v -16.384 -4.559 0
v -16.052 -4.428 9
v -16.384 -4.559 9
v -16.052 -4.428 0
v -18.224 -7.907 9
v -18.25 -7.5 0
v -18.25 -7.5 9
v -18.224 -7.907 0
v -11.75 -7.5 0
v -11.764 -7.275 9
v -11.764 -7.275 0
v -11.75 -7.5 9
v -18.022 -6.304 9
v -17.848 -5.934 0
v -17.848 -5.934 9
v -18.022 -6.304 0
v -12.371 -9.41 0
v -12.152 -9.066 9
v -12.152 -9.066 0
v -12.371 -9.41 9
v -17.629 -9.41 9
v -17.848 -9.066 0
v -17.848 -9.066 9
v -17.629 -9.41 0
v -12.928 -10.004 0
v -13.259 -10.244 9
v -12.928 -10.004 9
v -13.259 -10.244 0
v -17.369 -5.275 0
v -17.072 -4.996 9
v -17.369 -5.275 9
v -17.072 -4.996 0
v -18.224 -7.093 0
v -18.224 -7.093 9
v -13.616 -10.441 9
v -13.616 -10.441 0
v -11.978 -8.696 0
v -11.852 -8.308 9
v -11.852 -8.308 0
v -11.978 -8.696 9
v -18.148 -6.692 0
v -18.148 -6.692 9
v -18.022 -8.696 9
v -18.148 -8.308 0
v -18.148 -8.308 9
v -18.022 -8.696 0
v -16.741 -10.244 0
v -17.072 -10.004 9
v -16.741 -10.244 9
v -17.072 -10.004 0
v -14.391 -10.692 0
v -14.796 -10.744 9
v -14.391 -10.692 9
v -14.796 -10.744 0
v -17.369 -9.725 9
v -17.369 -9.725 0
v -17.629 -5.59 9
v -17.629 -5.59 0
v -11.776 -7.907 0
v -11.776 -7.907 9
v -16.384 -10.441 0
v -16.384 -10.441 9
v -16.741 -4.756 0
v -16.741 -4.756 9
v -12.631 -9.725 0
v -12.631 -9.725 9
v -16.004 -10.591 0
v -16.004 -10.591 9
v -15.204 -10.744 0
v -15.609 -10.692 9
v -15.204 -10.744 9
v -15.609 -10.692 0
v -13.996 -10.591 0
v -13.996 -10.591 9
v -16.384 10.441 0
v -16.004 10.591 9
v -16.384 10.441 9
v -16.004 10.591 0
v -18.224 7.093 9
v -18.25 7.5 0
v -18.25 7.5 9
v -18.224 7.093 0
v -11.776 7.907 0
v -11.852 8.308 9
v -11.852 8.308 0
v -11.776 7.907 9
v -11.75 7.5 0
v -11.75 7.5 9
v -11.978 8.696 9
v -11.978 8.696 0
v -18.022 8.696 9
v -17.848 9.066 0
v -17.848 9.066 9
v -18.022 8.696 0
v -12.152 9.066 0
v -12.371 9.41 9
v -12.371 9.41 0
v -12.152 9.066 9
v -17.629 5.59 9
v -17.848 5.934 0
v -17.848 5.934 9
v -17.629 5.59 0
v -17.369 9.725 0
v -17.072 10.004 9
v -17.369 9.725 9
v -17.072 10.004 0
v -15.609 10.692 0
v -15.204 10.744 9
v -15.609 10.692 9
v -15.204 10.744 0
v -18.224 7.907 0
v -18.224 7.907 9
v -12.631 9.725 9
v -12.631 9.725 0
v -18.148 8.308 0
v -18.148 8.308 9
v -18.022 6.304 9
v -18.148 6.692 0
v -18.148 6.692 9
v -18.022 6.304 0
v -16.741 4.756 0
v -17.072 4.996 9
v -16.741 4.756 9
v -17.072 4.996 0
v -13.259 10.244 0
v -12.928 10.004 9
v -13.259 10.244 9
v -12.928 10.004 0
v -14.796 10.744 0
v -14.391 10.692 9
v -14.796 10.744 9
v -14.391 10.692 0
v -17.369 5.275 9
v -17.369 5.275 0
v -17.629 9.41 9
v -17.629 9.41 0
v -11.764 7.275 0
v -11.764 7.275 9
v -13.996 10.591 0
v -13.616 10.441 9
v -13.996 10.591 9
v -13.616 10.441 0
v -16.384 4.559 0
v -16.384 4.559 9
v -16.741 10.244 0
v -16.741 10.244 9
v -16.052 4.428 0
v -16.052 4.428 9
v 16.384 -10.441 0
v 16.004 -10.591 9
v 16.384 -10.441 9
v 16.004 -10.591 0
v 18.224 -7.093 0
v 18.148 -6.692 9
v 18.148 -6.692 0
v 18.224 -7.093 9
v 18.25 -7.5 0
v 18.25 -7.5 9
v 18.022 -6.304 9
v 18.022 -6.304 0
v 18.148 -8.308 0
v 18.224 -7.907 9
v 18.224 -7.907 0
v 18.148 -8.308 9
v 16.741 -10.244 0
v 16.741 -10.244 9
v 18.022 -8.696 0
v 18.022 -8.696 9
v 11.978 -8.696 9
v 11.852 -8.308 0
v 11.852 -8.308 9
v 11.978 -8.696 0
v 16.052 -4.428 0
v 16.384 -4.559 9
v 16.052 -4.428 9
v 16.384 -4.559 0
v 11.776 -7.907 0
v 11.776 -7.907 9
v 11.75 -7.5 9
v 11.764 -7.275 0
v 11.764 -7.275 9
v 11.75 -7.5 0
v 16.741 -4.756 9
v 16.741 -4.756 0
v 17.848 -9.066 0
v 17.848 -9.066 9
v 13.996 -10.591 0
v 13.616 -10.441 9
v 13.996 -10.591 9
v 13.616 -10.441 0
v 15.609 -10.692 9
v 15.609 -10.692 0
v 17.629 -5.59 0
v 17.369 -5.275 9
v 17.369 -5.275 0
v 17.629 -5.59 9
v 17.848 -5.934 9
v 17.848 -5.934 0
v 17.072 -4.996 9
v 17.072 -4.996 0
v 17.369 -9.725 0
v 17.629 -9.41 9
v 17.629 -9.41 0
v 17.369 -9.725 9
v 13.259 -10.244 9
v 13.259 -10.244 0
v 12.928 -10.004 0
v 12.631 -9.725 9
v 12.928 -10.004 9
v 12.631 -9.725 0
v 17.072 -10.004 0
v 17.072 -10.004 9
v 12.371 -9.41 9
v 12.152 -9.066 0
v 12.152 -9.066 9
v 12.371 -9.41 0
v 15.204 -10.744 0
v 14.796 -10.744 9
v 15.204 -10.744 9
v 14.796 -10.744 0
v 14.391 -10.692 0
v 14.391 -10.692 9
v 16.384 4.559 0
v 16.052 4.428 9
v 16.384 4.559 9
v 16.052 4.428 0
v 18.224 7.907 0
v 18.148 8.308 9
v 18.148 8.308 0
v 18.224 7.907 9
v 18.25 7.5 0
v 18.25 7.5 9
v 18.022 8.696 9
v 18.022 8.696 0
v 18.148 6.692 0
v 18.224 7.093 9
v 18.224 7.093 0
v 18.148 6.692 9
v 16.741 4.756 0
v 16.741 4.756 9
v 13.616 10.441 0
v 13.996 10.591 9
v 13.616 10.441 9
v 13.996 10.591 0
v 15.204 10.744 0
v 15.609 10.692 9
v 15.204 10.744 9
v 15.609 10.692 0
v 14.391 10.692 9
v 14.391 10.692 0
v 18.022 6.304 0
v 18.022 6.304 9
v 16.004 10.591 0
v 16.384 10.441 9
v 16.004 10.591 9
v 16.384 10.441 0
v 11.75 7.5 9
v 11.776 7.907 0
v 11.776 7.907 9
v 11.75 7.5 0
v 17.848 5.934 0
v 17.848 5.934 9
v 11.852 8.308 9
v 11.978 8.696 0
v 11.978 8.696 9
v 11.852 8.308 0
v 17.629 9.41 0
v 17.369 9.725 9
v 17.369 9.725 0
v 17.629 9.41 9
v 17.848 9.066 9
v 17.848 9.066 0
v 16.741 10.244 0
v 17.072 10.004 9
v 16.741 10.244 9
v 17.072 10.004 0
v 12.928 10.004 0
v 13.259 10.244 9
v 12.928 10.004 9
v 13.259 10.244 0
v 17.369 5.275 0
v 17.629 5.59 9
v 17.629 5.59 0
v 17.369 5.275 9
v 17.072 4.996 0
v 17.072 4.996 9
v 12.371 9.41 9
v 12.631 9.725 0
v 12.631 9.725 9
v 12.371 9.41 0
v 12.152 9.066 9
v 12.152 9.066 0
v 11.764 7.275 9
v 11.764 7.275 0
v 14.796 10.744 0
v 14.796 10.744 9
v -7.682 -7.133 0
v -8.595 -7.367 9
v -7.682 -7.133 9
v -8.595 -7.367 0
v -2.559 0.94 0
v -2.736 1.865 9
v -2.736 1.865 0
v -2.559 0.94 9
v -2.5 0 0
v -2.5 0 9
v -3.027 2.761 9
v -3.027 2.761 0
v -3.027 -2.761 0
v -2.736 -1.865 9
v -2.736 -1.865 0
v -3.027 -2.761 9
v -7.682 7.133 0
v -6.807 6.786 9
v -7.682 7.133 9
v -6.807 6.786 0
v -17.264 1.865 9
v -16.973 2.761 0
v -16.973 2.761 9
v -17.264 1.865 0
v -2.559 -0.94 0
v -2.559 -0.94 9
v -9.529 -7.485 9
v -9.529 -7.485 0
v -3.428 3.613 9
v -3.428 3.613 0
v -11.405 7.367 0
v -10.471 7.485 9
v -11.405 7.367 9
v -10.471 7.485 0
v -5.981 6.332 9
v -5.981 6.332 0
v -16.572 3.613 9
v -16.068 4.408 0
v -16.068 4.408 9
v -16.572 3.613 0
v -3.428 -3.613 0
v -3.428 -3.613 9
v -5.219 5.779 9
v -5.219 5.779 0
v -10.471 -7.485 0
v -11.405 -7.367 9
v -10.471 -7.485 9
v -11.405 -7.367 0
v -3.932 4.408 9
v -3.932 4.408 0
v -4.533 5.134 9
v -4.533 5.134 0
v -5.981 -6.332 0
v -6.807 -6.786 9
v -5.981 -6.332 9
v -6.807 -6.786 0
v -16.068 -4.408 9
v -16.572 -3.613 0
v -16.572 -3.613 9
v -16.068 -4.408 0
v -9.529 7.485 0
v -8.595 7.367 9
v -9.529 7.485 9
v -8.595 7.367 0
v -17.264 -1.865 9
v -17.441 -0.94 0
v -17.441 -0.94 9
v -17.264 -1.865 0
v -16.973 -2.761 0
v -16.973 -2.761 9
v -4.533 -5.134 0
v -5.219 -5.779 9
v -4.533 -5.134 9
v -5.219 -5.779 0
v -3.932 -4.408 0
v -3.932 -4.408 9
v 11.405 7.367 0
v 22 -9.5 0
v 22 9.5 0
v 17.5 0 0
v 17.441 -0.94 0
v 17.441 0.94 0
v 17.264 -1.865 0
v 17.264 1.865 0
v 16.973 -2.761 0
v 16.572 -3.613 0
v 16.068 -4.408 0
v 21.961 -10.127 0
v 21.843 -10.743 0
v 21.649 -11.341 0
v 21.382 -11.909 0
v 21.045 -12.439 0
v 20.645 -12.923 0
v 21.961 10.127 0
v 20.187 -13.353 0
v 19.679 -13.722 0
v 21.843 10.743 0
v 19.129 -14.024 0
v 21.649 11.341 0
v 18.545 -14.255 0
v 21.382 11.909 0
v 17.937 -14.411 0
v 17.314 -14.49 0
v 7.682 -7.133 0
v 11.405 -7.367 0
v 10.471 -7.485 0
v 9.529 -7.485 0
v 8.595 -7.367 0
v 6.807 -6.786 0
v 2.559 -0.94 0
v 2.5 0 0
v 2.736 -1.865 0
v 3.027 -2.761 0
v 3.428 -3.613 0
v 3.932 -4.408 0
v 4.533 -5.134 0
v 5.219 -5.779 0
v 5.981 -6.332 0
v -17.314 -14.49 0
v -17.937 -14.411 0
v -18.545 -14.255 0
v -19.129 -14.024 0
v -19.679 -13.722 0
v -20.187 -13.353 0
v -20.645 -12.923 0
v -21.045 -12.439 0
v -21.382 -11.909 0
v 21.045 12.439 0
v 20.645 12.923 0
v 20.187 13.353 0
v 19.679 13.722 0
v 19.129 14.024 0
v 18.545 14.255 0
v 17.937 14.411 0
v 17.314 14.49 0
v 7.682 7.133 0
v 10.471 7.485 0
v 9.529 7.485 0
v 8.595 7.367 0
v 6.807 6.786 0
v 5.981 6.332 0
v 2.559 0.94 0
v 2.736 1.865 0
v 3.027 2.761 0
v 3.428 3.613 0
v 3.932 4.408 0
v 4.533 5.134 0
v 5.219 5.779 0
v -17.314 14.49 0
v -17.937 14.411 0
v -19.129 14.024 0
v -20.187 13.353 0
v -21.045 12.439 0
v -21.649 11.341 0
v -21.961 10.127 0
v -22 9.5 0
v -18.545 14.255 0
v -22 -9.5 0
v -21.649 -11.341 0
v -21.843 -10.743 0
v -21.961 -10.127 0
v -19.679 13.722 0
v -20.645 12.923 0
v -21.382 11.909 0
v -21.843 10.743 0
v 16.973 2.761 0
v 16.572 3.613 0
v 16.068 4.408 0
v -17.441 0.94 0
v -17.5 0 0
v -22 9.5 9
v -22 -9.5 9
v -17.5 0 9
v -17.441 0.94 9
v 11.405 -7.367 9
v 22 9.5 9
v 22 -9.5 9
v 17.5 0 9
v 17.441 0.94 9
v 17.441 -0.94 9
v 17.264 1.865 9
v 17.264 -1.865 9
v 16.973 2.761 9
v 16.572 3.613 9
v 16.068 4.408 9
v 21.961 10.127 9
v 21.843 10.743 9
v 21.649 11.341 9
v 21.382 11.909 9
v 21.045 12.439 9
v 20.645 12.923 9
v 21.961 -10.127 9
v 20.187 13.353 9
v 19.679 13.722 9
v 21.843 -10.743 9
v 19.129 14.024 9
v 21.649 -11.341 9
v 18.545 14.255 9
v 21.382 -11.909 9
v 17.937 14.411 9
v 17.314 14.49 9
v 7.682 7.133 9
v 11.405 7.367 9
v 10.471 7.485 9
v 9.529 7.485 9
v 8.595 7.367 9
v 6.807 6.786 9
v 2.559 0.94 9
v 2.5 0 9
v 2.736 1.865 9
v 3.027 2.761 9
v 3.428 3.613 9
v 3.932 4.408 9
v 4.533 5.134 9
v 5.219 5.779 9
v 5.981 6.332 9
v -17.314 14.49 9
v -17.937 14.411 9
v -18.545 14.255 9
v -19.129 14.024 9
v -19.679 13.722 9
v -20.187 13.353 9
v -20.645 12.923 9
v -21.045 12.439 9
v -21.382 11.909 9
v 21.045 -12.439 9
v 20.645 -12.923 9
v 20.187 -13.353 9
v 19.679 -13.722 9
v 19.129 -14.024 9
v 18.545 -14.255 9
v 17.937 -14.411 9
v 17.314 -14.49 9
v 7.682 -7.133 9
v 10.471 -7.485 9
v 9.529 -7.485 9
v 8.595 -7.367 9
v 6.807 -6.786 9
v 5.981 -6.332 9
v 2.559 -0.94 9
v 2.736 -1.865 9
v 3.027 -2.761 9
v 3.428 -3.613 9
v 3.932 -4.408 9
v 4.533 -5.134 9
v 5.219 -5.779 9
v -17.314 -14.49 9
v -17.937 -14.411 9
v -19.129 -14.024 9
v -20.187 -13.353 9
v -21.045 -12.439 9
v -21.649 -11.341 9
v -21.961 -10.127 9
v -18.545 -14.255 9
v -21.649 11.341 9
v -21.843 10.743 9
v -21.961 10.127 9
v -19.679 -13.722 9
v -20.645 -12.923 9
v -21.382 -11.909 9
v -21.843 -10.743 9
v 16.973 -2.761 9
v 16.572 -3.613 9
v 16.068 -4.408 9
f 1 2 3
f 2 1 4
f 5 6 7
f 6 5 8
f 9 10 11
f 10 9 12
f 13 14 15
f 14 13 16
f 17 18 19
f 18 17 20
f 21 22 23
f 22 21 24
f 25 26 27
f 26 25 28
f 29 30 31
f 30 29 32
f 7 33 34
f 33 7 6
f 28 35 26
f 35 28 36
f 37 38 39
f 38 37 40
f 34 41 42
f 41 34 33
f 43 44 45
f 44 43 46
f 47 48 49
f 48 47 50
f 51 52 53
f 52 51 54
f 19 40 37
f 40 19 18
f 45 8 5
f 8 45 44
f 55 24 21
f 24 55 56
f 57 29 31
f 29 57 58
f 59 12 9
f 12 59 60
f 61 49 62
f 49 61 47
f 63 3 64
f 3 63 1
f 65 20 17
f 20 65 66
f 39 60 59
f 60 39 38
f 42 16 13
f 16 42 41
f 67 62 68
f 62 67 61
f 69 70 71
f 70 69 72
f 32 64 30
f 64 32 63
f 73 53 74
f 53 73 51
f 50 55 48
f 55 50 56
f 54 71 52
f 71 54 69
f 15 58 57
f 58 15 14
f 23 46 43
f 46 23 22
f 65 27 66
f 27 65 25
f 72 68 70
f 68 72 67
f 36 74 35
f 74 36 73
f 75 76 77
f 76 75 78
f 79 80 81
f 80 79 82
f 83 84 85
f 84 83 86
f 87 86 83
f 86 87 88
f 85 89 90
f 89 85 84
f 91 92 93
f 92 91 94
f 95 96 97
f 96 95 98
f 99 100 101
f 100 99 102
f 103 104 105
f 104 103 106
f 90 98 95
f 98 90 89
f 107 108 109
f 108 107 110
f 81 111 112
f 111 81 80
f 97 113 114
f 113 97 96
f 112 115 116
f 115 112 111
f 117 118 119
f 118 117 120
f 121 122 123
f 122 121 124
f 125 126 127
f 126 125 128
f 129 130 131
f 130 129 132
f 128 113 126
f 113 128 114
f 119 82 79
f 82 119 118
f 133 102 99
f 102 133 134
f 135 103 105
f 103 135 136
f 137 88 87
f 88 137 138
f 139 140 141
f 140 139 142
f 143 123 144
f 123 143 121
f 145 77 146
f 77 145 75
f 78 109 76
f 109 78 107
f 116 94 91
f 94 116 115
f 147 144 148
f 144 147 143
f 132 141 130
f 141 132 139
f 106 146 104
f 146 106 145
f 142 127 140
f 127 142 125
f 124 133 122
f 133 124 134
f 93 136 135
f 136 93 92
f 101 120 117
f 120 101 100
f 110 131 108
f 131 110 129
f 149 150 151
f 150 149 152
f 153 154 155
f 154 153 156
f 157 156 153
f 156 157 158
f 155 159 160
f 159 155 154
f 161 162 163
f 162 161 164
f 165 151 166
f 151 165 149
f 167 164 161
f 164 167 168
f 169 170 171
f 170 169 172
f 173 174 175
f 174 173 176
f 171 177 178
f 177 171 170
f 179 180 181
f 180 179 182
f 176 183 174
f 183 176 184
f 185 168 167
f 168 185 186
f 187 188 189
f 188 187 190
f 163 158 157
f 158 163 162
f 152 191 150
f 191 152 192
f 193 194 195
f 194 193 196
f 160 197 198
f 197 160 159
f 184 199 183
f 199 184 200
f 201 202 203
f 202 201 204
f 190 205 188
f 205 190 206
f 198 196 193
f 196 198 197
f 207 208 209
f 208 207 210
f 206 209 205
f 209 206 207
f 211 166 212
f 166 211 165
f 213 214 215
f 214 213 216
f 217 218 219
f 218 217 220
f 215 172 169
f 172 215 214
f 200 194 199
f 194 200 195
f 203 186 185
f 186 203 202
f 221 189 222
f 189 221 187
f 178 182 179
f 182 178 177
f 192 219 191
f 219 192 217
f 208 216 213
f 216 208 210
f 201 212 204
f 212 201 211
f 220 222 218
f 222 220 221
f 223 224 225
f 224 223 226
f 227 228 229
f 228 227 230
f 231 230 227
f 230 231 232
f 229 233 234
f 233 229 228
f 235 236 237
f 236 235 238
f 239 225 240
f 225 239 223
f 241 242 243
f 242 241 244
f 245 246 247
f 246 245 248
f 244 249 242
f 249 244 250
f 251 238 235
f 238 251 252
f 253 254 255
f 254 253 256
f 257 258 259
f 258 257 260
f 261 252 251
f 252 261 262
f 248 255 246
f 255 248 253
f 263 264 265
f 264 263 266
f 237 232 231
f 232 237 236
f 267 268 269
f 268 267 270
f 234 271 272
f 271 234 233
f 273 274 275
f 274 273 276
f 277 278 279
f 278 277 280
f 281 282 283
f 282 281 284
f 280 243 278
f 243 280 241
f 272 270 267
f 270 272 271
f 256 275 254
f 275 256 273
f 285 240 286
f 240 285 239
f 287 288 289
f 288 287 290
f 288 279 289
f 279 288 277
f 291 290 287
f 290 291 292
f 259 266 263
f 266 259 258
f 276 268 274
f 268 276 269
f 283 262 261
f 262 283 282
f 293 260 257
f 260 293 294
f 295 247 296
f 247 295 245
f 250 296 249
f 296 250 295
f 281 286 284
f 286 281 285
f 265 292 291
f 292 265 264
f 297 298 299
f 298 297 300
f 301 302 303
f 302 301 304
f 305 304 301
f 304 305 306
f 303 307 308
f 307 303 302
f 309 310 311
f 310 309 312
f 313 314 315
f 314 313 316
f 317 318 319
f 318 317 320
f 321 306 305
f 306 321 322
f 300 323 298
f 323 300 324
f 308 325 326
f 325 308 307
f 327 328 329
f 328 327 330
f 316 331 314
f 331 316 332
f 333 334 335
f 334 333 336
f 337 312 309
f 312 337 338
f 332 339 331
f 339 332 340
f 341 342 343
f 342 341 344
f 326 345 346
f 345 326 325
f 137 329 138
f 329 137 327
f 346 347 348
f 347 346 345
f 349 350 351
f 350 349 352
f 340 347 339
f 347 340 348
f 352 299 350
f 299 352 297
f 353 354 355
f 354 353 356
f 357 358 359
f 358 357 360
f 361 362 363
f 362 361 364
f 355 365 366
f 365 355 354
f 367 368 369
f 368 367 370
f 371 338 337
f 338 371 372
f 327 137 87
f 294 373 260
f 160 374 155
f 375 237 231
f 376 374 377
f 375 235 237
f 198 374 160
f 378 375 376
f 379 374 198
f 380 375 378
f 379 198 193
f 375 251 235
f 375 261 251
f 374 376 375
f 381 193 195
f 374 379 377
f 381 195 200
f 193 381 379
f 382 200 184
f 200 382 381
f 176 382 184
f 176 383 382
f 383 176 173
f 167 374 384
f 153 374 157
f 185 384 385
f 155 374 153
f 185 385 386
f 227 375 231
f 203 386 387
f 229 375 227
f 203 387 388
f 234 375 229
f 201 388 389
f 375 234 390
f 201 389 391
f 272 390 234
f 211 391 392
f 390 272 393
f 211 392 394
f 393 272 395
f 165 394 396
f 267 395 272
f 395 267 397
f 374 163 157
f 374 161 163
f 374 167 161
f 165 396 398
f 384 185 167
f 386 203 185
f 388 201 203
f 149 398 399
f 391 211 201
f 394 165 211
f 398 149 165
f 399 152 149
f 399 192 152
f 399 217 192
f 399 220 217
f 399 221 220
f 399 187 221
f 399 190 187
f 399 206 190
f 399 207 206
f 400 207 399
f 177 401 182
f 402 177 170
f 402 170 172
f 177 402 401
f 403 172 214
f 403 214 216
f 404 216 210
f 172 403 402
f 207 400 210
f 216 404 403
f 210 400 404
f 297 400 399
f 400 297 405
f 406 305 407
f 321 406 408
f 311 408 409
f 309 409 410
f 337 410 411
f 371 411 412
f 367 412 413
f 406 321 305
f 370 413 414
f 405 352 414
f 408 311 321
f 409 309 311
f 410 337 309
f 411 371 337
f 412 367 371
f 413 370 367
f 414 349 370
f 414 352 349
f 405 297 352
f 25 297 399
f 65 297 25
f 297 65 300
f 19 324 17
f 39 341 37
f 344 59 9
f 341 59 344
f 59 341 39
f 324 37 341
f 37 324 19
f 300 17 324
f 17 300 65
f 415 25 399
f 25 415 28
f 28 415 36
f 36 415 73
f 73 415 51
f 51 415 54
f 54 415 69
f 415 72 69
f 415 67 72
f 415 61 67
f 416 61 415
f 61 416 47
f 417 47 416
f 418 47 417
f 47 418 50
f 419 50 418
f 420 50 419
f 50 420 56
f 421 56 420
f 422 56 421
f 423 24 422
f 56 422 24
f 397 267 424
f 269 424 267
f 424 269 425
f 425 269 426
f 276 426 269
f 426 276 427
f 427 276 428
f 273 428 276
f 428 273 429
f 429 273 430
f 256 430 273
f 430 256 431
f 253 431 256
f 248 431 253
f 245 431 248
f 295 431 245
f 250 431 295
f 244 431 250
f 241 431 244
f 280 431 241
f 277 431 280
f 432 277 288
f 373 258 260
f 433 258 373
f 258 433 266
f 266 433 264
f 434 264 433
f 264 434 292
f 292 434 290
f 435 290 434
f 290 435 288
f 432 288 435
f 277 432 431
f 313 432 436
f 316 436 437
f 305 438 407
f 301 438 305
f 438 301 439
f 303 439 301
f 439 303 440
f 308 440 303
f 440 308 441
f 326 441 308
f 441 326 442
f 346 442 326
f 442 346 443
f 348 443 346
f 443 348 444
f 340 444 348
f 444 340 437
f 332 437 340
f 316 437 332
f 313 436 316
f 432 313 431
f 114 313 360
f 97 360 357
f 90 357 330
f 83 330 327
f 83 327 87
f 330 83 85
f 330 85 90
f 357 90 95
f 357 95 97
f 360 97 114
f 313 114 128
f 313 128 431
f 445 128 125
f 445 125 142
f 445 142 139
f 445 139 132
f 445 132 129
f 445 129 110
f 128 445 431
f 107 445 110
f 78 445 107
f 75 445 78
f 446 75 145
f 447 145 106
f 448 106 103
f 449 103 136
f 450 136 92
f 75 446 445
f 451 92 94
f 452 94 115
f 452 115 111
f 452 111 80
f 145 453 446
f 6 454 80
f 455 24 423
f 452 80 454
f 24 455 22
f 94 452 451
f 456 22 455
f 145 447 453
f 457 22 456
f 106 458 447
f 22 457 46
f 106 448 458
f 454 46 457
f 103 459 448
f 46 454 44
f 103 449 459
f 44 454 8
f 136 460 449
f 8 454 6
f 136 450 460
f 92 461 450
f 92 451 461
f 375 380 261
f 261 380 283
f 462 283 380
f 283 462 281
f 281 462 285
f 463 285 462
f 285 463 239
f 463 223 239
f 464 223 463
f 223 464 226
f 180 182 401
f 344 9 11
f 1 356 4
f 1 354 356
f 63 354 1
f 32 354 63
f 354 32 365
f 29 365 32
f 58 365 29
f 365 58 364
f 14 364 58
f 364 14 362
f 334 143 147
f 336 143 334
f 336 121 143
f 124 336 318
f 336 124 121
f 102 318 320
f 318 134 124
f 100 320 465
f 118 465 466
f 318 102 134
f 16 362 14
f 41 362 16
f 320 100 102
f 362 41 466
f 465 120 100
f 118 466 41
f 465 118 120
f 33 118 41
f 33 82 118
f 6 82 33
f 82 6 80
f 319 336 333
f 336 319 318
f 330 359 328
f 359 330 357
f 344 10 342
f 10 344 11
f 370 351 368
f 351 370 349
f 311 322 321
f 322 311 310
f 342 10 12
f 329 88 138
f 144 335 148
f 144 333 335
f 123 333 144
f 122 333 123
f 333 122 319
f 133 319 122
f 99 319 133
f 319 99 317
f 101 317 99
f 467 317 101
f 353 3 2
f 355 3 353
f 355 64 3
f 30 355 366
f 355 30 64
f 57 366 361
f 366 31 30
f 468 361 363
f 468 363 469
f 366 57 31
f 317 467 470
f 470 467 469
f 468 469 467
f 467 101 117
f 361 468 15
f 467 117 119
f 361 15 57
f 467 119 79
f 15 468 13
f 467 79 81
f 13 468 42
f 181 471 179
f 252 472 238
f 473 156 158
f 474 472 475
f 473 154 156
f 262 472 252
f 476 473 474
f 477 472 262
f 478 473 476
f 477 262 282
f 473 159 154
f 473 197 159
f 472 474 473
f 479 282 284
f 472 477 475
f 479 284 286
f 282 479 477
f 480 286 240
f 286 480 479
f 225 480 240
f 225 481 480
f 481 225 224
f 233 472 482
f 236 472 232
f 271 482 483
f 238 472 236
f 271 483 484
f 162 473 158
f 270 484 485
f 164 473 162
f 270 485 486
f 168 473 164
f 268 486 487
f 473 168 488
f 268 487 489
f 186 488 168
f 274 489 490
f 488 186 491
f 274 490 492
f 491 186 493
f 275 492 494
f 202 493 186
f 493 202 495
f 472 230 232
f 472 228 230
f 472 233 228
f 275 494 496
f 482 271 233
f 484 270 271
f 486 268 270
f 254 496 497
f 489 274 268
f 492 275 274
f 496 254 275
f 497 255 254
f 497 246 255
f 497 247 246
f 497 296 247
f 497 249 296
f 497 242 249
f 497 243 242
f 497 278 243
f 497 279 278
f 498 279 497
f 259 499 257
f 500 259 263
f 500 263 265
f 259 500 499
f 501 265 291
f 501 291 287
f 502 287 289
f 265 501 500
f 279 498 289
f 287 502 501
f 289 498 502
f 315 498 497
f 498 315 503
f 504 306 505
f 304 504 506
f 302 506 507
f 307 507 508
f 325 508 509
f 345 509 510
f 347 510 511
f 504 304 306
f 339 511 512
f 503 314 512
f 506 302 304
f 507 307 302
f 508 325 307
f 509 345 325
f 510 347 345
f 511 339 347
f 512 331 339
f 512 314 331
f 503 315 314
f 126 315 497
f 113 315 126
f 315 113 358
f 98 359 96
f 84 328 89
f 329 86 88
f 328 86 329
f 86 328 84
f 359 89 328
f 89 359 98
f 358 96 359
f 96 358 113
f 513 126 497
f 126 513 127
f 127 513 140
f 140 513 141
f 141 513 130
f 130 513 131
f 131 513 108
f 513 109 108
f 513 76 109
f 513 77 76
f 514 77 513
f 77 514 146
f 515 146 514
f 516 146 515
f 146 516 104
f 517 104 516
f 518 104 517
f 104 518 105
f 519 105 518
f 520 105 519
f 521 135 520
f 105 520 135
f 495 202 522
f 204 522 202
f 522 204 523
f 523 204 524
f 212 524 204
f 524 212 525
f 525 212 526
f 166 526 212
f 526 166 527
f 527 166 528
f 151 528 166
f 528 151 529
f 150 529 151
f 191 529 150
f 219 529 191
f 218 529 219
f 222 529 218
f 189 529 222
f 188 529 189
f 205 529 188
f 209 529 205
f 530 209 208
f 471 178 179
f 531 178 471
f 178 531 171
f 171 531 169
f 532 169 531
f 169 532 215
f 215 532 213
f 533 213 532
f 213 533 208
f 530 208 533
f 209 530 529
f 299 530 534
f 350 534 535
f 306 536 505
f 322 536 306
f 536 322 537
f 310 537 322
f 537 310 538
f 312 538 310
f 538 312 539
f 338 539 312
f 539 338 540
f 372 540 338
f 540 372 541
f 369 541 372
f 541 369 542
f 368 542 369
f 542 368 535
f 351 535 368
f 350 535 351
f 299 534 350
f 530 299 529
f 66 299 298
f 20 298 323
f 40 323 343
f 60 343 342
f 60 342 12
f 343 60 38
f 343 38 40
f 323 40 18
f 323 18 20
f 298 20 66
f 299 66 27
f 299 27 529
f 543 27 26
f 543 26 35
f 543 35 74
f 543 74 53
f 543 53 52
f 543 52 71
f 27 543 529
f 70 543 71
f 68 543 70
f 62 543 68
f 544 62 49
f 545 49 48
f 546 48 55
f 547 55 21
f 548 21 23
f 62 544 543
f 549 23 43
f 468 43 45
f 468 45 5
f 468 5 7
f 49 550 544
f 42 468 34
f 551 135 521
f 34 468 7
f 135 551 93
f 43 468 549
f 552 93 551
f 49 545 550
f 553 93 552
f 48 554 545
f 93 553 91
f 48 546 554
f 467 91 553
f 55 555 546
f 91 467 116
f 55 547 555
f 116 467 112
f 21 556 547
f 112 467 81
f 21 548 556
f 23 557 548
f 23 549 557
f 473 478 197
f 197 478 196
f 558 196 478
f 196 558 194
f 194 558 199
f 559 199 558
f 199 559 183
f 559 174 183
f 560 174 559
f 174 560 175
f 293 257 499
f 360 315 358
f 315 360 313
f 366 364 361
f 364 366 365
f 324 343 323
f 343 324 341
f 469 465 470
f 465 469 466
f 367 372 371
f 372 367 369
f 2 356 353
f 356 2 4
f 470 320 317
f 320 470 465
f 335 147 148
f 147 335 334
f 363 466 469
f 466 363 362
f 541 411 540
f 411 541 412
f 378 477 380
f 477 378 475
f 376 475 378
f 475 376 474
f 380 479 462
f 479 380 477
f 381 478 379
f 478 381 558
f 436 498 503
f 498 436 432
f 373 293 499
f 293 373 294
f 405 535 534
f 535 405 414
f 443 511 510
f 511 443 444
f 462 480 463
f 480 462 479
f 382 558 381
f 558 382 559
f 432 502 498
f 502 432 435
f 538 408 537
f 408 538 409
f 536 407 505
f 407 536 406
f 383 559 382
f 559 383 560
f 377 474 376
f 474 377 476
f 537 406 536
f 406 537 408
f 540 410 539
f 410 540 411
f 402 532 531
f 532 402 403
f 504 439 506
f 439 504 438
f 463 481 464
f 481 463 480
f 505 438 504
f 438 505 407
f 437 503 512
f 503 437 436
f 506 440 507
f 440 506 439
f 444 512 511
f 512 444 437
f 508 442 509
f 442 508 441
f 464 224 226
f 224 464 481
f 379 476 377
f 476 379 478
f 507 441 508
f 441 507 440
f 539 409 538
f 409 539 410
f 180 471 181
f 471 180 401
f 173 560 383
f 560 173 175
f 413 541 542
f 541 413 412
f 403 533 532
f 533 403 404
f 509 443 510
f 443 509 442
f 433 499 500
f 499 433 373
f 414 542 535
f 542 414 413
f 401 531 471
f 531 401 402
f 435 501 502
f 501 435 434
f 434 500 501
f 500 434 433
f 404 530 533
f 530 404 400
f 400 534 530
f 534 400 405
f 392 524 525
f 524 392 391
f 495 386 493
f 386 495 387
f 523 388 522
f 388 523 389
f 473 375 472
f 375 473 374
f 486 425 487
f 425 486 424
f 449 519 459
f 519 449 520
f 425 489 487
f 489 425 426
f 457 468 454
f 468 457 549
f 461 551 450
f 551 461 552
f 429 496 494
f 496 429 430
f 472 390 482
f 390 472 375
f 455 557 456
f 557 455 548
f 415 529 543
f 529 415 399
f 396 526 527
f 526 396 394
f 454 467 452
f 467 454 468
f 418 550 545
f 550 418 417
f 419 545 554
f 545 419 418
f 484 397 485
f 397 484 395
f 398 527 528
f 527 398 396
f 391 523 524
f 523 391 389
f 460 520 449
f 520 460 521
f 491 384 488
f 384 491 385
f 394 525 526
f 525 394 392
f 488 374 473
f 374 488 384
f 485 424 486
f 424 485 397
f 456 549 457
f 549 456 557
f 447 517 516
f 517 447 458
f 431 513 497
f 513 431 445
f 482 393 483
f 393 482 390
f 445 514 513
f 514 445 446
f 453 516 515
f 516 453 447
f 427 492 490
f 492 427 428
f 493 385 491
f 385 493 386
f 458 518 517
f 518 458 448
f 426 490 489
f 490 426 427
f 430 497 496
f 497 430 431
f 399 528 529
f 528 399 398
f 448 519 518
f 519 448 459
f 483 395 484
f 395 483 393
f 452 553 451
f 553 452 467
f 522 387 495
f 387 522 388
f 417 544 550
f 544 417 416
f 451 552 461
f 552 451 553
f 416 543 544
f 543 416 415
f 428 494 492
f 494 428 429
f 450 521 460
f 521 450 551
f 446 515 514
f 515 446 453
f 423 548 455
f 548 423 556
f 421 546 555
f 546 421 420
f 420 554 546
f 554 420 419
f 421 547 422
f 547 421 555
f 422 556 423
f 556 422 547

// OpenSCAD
$fn = 50;

difference() {
	union() {
		hull() {
			translate(v = [-17.0, 9.5, 0]) {
				cylinder(h = 9, r = 5);
			}
			translate(v = [17.0, 9.5, 0]) {
				cylinder(h = 9, r = 5);
			}
			translate(v = [-17.0, -9.5, 0]) {
				cylinder(h = 9, r = 5);
			}
			translate(v = [17.0, -9.5, 0]) {
				cylinder(h = 9, r = 5);
			}
		}
	}
	union() {
		translate(v = [-15.0, -7.5, -100.0]) {
			cylinder(h = 200, r = 3.25);
		}
		translate(v = [-15.0, 7.5, -100.0]) {
			cylinder(h = 200, r = 3.25);
		}
		translate(v = [15.0, -7.5, -100.0]) {
			cylinder(h = 200, r = 3.25);
		}
		translate(v = [15.0, 7.5, -100.0]) {
			cylinder(h = 200, r = 3.25);
		}
		translate(v = [-15.0, -7.5, -100.0]) {
			cylinder(h = 200, r = 1.8);
		}
		translate(v = [-15.0, 7.5, -100.0]) {
			cylinder(h = 200, r = 1.8);
		}
		translate(v = [15.0, -7.5, -100.0]) {
			cylinder(h = 200, r = 1.8);
		}
		translate(v = [15.0, 7.5, -100.0]) {
			cylinder(h = 200, r = 1.8);
		}
		translate(v = [-10.0, 0, 0.0]) {
			cylinder(h = 9, r = 7.5);
		}
		translate(v = [10.0, 0, 0.0]) {
			cylinder(h = 9, r = 7.5);
		}
	}
}
